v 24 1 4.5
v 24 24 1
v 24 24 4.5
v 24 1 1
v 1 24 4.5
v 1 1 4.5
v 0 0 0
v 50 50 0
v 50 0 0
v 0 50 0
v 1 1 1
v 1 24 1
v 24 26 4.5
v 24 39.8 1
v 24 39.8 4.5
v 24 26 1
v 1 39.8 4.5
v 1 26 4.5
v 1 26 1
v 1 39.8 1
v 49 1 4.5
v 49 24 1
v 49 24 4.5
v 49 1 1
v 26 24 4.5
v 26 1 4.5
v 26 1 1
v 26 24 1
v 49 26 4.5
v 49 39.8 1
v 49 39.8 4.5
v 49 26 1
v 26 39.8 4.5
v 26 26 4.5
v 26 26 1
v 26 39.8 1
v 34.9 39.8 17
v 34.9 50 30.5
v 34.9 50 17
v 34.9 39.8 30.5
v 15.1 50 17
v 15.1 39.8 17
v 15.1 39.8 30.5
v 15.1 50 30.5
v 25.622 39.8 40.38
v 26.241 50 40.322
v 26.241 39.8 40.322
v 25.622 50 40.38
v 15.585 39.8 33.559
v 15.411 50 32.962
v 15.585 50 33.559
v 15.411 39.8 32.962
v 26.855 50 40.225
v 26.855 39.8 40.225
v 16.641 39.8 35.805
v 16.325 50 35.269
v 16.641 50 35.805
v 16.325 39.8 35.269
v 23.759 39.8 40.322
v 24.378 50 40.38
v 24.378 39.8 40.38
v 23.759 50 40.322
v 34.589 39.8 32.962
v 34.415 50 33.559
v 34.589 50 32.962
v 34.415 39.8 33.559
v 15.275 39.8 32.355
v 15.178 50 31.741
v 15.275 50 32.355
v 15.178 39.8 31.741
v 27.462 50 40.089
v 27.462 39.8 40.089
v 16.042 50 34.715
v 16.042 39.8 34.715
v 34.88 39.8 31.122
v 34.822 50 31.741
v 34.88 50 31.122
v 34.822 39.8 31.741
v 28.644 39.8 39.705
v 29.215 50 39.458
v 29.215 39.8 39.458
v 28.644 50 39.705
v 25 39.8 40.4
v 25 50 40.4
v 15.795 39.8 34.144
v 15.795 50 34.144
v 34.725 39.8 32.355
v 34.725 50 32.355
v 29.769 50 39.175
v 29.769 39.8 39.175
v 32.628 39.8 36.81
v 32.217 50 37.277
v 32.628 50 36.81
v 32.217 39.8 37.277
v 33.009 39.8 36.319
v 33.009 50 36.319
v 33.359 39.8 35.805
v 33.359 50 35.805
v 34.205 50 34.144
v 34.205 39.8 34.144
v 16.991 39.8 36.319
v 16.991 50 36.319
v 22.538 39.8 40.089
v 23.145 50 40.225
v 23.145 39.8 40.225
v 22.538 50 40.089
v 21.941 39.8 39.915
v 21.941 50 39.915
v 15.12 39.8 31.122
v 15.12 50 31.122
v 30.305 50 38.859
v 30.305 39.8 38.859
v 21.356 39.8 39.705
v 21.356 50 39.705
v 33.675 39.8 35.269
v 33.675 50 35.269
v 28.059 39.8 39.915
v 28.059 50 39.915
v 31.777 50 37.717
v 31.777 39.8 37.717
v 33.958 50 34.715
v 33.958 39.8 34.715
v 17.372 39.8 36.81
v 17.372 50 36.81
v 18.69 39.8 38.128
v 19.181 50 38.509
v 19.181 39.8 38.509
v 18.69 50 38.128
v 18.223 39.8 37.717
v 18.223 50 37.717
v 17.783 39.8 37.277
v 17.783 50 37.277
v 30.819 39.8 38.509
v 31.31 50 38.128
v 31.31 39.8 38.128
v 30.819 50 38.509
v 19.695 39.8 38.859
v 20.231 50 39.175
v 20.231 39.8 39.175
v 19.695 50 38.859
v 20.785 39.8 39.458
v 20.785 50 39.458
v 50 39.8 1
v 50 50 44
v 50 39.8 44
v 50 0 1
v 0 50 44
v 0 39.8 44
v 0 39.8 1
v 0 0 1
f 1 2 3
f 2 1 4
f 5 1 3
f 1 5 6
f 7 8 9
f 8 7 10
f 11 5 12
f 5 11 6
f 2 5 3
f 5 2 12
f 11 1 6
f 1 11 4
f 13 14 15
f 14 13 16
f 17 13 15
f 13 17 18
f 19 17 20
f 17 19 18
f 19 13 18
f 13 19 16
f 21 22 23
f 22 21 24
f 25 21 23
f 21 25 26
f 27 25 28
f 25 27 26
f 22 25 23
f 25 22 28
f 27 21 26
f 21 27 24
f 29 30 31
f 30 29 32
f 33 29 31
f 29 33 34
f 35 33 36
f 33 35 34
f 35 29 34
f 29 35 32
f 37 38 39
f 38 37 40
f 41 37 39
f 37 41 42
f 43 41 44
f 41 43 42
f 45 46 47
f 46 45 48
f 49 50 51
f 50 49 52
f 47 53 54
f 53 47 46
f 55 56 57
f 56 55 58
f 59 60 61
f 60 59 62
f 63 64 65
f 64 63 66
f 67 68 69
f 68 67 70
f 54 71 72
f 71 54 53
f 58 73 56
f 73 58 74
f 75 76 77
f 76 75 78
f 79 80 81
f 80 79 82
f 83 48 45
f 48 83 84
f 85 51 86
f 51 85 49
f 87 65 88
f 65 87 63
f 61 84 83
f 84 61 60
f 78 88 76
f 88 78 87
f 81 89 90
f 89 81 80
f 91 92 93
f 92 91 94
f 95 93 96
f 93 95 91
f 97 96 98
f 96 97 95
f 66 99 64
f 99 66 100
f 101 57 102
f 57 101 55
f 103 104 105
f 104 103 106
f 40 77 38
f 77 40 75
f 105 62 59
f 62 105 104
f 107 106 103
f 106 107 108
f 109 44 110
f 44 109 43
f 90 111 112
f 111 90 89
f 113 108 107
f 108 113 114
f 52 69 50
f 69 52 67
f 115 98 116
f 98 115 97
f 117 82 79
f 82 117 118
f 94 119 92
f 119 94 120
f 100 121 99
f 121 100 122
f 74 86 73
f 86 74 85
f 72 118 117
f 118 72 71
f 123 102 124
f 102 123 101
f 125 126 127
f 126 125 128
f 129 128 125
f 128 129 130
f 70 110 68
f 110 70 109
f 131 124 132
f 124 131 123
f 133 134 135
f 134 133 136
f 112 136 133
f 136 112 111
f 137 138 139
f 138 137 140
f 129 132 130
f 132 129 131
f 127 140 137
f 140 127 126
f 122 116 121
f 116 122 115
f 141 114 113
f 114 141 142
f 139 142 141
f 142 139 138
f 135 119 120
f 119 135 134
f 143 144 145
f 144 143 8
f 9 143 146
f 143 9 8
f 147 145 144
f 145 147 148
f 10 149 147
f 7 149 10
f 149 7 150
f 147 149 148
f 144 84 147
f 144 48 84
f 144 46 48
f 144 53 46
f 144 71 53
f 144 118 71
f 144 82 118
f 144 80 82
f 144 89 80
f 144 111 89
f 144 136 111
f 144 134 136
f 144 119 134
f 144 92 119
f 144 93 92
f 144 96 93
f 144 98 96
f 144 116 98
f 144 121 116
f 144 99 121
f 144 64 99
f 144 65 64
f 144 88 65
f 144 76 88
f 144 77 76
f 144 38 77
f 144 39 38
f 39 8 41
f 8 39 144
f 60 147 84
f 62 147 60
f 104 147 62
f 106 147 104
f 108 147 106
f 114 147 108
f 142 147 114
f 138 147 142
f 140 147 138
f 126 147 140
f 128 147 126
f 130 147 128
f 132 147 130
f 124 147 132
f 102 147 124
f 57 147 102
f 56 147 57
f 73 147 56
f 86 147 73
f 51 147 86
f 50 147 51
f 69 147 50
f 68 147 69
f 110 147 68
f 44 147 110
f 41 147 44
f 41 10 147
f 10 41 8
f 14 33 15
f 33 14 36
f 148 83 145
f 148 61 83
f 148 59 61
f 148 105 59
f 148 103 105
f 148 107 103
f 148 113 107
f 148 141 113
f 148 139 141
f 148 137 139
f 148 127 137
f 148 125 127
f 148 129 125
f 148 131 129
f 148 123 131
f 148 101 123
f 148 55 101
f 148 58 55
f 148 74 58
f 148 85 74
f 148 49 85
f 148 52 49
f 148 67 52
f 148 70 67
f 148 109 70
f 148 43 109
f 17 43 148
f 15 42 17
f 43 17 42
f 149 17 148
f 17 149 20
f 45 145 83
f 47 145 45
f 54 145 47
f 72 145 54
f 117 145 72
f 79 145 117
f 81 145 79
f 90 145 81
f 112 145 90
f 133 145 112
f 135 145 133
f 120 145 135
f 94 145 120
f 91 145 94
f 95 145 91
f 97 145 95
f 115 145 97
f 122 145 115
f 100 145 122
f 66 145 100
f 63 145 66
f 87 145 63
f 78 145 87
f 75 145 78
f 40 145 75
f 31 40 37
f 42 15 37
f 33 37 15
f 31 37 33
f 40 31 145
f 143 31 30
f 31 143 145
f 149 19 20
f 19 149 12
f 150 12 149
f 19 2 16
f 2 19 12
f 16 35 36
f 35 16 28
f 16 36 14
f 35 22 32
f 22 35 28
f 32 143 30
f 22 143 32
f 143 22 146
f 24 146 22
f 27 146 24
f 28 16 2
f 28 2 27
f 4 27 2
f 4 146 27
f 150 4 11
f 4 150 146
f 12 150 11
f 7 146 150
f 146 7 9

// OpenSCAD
_basis = 25;

module arched_window_hole() {
    translate([-25,0,11.2-.8-6]) {
        translate([15.1,-25,12.6]) cube([19.8,40,13.5]);
        translate([25,-25,12.6+13.5]) rotate([-90,0,0]) cylinder(40,19.8/2,19.8/2,$fn=100);
    }
}

module arched_window(x=2, y=2, base=false) {
    h=2;
    base_buffer = base ? 6 : 0;
    translate([0,0,base_buffer]) color("LightGray") {
        for (i = [0:x-1]) {
            for (j = [0:y-1]) {
                translate([_basis*i+1,_basis*j+1,0]) cube([23,23,4.5]);
            }
        }
    }
    color("Grey") {
        cube([_basis*x,_basis*y,1+base_buffer]);
        difference() {
            translate([0,_basis*y-10.2,0]) cube([_basis*x,10.2,_basis*h-6+base_buffer]);
            translate([_basis*x/2,_basis*y,base_buffer]) arched_window_hole();
        }
    }
}

arched_window(x=2,base=false);
